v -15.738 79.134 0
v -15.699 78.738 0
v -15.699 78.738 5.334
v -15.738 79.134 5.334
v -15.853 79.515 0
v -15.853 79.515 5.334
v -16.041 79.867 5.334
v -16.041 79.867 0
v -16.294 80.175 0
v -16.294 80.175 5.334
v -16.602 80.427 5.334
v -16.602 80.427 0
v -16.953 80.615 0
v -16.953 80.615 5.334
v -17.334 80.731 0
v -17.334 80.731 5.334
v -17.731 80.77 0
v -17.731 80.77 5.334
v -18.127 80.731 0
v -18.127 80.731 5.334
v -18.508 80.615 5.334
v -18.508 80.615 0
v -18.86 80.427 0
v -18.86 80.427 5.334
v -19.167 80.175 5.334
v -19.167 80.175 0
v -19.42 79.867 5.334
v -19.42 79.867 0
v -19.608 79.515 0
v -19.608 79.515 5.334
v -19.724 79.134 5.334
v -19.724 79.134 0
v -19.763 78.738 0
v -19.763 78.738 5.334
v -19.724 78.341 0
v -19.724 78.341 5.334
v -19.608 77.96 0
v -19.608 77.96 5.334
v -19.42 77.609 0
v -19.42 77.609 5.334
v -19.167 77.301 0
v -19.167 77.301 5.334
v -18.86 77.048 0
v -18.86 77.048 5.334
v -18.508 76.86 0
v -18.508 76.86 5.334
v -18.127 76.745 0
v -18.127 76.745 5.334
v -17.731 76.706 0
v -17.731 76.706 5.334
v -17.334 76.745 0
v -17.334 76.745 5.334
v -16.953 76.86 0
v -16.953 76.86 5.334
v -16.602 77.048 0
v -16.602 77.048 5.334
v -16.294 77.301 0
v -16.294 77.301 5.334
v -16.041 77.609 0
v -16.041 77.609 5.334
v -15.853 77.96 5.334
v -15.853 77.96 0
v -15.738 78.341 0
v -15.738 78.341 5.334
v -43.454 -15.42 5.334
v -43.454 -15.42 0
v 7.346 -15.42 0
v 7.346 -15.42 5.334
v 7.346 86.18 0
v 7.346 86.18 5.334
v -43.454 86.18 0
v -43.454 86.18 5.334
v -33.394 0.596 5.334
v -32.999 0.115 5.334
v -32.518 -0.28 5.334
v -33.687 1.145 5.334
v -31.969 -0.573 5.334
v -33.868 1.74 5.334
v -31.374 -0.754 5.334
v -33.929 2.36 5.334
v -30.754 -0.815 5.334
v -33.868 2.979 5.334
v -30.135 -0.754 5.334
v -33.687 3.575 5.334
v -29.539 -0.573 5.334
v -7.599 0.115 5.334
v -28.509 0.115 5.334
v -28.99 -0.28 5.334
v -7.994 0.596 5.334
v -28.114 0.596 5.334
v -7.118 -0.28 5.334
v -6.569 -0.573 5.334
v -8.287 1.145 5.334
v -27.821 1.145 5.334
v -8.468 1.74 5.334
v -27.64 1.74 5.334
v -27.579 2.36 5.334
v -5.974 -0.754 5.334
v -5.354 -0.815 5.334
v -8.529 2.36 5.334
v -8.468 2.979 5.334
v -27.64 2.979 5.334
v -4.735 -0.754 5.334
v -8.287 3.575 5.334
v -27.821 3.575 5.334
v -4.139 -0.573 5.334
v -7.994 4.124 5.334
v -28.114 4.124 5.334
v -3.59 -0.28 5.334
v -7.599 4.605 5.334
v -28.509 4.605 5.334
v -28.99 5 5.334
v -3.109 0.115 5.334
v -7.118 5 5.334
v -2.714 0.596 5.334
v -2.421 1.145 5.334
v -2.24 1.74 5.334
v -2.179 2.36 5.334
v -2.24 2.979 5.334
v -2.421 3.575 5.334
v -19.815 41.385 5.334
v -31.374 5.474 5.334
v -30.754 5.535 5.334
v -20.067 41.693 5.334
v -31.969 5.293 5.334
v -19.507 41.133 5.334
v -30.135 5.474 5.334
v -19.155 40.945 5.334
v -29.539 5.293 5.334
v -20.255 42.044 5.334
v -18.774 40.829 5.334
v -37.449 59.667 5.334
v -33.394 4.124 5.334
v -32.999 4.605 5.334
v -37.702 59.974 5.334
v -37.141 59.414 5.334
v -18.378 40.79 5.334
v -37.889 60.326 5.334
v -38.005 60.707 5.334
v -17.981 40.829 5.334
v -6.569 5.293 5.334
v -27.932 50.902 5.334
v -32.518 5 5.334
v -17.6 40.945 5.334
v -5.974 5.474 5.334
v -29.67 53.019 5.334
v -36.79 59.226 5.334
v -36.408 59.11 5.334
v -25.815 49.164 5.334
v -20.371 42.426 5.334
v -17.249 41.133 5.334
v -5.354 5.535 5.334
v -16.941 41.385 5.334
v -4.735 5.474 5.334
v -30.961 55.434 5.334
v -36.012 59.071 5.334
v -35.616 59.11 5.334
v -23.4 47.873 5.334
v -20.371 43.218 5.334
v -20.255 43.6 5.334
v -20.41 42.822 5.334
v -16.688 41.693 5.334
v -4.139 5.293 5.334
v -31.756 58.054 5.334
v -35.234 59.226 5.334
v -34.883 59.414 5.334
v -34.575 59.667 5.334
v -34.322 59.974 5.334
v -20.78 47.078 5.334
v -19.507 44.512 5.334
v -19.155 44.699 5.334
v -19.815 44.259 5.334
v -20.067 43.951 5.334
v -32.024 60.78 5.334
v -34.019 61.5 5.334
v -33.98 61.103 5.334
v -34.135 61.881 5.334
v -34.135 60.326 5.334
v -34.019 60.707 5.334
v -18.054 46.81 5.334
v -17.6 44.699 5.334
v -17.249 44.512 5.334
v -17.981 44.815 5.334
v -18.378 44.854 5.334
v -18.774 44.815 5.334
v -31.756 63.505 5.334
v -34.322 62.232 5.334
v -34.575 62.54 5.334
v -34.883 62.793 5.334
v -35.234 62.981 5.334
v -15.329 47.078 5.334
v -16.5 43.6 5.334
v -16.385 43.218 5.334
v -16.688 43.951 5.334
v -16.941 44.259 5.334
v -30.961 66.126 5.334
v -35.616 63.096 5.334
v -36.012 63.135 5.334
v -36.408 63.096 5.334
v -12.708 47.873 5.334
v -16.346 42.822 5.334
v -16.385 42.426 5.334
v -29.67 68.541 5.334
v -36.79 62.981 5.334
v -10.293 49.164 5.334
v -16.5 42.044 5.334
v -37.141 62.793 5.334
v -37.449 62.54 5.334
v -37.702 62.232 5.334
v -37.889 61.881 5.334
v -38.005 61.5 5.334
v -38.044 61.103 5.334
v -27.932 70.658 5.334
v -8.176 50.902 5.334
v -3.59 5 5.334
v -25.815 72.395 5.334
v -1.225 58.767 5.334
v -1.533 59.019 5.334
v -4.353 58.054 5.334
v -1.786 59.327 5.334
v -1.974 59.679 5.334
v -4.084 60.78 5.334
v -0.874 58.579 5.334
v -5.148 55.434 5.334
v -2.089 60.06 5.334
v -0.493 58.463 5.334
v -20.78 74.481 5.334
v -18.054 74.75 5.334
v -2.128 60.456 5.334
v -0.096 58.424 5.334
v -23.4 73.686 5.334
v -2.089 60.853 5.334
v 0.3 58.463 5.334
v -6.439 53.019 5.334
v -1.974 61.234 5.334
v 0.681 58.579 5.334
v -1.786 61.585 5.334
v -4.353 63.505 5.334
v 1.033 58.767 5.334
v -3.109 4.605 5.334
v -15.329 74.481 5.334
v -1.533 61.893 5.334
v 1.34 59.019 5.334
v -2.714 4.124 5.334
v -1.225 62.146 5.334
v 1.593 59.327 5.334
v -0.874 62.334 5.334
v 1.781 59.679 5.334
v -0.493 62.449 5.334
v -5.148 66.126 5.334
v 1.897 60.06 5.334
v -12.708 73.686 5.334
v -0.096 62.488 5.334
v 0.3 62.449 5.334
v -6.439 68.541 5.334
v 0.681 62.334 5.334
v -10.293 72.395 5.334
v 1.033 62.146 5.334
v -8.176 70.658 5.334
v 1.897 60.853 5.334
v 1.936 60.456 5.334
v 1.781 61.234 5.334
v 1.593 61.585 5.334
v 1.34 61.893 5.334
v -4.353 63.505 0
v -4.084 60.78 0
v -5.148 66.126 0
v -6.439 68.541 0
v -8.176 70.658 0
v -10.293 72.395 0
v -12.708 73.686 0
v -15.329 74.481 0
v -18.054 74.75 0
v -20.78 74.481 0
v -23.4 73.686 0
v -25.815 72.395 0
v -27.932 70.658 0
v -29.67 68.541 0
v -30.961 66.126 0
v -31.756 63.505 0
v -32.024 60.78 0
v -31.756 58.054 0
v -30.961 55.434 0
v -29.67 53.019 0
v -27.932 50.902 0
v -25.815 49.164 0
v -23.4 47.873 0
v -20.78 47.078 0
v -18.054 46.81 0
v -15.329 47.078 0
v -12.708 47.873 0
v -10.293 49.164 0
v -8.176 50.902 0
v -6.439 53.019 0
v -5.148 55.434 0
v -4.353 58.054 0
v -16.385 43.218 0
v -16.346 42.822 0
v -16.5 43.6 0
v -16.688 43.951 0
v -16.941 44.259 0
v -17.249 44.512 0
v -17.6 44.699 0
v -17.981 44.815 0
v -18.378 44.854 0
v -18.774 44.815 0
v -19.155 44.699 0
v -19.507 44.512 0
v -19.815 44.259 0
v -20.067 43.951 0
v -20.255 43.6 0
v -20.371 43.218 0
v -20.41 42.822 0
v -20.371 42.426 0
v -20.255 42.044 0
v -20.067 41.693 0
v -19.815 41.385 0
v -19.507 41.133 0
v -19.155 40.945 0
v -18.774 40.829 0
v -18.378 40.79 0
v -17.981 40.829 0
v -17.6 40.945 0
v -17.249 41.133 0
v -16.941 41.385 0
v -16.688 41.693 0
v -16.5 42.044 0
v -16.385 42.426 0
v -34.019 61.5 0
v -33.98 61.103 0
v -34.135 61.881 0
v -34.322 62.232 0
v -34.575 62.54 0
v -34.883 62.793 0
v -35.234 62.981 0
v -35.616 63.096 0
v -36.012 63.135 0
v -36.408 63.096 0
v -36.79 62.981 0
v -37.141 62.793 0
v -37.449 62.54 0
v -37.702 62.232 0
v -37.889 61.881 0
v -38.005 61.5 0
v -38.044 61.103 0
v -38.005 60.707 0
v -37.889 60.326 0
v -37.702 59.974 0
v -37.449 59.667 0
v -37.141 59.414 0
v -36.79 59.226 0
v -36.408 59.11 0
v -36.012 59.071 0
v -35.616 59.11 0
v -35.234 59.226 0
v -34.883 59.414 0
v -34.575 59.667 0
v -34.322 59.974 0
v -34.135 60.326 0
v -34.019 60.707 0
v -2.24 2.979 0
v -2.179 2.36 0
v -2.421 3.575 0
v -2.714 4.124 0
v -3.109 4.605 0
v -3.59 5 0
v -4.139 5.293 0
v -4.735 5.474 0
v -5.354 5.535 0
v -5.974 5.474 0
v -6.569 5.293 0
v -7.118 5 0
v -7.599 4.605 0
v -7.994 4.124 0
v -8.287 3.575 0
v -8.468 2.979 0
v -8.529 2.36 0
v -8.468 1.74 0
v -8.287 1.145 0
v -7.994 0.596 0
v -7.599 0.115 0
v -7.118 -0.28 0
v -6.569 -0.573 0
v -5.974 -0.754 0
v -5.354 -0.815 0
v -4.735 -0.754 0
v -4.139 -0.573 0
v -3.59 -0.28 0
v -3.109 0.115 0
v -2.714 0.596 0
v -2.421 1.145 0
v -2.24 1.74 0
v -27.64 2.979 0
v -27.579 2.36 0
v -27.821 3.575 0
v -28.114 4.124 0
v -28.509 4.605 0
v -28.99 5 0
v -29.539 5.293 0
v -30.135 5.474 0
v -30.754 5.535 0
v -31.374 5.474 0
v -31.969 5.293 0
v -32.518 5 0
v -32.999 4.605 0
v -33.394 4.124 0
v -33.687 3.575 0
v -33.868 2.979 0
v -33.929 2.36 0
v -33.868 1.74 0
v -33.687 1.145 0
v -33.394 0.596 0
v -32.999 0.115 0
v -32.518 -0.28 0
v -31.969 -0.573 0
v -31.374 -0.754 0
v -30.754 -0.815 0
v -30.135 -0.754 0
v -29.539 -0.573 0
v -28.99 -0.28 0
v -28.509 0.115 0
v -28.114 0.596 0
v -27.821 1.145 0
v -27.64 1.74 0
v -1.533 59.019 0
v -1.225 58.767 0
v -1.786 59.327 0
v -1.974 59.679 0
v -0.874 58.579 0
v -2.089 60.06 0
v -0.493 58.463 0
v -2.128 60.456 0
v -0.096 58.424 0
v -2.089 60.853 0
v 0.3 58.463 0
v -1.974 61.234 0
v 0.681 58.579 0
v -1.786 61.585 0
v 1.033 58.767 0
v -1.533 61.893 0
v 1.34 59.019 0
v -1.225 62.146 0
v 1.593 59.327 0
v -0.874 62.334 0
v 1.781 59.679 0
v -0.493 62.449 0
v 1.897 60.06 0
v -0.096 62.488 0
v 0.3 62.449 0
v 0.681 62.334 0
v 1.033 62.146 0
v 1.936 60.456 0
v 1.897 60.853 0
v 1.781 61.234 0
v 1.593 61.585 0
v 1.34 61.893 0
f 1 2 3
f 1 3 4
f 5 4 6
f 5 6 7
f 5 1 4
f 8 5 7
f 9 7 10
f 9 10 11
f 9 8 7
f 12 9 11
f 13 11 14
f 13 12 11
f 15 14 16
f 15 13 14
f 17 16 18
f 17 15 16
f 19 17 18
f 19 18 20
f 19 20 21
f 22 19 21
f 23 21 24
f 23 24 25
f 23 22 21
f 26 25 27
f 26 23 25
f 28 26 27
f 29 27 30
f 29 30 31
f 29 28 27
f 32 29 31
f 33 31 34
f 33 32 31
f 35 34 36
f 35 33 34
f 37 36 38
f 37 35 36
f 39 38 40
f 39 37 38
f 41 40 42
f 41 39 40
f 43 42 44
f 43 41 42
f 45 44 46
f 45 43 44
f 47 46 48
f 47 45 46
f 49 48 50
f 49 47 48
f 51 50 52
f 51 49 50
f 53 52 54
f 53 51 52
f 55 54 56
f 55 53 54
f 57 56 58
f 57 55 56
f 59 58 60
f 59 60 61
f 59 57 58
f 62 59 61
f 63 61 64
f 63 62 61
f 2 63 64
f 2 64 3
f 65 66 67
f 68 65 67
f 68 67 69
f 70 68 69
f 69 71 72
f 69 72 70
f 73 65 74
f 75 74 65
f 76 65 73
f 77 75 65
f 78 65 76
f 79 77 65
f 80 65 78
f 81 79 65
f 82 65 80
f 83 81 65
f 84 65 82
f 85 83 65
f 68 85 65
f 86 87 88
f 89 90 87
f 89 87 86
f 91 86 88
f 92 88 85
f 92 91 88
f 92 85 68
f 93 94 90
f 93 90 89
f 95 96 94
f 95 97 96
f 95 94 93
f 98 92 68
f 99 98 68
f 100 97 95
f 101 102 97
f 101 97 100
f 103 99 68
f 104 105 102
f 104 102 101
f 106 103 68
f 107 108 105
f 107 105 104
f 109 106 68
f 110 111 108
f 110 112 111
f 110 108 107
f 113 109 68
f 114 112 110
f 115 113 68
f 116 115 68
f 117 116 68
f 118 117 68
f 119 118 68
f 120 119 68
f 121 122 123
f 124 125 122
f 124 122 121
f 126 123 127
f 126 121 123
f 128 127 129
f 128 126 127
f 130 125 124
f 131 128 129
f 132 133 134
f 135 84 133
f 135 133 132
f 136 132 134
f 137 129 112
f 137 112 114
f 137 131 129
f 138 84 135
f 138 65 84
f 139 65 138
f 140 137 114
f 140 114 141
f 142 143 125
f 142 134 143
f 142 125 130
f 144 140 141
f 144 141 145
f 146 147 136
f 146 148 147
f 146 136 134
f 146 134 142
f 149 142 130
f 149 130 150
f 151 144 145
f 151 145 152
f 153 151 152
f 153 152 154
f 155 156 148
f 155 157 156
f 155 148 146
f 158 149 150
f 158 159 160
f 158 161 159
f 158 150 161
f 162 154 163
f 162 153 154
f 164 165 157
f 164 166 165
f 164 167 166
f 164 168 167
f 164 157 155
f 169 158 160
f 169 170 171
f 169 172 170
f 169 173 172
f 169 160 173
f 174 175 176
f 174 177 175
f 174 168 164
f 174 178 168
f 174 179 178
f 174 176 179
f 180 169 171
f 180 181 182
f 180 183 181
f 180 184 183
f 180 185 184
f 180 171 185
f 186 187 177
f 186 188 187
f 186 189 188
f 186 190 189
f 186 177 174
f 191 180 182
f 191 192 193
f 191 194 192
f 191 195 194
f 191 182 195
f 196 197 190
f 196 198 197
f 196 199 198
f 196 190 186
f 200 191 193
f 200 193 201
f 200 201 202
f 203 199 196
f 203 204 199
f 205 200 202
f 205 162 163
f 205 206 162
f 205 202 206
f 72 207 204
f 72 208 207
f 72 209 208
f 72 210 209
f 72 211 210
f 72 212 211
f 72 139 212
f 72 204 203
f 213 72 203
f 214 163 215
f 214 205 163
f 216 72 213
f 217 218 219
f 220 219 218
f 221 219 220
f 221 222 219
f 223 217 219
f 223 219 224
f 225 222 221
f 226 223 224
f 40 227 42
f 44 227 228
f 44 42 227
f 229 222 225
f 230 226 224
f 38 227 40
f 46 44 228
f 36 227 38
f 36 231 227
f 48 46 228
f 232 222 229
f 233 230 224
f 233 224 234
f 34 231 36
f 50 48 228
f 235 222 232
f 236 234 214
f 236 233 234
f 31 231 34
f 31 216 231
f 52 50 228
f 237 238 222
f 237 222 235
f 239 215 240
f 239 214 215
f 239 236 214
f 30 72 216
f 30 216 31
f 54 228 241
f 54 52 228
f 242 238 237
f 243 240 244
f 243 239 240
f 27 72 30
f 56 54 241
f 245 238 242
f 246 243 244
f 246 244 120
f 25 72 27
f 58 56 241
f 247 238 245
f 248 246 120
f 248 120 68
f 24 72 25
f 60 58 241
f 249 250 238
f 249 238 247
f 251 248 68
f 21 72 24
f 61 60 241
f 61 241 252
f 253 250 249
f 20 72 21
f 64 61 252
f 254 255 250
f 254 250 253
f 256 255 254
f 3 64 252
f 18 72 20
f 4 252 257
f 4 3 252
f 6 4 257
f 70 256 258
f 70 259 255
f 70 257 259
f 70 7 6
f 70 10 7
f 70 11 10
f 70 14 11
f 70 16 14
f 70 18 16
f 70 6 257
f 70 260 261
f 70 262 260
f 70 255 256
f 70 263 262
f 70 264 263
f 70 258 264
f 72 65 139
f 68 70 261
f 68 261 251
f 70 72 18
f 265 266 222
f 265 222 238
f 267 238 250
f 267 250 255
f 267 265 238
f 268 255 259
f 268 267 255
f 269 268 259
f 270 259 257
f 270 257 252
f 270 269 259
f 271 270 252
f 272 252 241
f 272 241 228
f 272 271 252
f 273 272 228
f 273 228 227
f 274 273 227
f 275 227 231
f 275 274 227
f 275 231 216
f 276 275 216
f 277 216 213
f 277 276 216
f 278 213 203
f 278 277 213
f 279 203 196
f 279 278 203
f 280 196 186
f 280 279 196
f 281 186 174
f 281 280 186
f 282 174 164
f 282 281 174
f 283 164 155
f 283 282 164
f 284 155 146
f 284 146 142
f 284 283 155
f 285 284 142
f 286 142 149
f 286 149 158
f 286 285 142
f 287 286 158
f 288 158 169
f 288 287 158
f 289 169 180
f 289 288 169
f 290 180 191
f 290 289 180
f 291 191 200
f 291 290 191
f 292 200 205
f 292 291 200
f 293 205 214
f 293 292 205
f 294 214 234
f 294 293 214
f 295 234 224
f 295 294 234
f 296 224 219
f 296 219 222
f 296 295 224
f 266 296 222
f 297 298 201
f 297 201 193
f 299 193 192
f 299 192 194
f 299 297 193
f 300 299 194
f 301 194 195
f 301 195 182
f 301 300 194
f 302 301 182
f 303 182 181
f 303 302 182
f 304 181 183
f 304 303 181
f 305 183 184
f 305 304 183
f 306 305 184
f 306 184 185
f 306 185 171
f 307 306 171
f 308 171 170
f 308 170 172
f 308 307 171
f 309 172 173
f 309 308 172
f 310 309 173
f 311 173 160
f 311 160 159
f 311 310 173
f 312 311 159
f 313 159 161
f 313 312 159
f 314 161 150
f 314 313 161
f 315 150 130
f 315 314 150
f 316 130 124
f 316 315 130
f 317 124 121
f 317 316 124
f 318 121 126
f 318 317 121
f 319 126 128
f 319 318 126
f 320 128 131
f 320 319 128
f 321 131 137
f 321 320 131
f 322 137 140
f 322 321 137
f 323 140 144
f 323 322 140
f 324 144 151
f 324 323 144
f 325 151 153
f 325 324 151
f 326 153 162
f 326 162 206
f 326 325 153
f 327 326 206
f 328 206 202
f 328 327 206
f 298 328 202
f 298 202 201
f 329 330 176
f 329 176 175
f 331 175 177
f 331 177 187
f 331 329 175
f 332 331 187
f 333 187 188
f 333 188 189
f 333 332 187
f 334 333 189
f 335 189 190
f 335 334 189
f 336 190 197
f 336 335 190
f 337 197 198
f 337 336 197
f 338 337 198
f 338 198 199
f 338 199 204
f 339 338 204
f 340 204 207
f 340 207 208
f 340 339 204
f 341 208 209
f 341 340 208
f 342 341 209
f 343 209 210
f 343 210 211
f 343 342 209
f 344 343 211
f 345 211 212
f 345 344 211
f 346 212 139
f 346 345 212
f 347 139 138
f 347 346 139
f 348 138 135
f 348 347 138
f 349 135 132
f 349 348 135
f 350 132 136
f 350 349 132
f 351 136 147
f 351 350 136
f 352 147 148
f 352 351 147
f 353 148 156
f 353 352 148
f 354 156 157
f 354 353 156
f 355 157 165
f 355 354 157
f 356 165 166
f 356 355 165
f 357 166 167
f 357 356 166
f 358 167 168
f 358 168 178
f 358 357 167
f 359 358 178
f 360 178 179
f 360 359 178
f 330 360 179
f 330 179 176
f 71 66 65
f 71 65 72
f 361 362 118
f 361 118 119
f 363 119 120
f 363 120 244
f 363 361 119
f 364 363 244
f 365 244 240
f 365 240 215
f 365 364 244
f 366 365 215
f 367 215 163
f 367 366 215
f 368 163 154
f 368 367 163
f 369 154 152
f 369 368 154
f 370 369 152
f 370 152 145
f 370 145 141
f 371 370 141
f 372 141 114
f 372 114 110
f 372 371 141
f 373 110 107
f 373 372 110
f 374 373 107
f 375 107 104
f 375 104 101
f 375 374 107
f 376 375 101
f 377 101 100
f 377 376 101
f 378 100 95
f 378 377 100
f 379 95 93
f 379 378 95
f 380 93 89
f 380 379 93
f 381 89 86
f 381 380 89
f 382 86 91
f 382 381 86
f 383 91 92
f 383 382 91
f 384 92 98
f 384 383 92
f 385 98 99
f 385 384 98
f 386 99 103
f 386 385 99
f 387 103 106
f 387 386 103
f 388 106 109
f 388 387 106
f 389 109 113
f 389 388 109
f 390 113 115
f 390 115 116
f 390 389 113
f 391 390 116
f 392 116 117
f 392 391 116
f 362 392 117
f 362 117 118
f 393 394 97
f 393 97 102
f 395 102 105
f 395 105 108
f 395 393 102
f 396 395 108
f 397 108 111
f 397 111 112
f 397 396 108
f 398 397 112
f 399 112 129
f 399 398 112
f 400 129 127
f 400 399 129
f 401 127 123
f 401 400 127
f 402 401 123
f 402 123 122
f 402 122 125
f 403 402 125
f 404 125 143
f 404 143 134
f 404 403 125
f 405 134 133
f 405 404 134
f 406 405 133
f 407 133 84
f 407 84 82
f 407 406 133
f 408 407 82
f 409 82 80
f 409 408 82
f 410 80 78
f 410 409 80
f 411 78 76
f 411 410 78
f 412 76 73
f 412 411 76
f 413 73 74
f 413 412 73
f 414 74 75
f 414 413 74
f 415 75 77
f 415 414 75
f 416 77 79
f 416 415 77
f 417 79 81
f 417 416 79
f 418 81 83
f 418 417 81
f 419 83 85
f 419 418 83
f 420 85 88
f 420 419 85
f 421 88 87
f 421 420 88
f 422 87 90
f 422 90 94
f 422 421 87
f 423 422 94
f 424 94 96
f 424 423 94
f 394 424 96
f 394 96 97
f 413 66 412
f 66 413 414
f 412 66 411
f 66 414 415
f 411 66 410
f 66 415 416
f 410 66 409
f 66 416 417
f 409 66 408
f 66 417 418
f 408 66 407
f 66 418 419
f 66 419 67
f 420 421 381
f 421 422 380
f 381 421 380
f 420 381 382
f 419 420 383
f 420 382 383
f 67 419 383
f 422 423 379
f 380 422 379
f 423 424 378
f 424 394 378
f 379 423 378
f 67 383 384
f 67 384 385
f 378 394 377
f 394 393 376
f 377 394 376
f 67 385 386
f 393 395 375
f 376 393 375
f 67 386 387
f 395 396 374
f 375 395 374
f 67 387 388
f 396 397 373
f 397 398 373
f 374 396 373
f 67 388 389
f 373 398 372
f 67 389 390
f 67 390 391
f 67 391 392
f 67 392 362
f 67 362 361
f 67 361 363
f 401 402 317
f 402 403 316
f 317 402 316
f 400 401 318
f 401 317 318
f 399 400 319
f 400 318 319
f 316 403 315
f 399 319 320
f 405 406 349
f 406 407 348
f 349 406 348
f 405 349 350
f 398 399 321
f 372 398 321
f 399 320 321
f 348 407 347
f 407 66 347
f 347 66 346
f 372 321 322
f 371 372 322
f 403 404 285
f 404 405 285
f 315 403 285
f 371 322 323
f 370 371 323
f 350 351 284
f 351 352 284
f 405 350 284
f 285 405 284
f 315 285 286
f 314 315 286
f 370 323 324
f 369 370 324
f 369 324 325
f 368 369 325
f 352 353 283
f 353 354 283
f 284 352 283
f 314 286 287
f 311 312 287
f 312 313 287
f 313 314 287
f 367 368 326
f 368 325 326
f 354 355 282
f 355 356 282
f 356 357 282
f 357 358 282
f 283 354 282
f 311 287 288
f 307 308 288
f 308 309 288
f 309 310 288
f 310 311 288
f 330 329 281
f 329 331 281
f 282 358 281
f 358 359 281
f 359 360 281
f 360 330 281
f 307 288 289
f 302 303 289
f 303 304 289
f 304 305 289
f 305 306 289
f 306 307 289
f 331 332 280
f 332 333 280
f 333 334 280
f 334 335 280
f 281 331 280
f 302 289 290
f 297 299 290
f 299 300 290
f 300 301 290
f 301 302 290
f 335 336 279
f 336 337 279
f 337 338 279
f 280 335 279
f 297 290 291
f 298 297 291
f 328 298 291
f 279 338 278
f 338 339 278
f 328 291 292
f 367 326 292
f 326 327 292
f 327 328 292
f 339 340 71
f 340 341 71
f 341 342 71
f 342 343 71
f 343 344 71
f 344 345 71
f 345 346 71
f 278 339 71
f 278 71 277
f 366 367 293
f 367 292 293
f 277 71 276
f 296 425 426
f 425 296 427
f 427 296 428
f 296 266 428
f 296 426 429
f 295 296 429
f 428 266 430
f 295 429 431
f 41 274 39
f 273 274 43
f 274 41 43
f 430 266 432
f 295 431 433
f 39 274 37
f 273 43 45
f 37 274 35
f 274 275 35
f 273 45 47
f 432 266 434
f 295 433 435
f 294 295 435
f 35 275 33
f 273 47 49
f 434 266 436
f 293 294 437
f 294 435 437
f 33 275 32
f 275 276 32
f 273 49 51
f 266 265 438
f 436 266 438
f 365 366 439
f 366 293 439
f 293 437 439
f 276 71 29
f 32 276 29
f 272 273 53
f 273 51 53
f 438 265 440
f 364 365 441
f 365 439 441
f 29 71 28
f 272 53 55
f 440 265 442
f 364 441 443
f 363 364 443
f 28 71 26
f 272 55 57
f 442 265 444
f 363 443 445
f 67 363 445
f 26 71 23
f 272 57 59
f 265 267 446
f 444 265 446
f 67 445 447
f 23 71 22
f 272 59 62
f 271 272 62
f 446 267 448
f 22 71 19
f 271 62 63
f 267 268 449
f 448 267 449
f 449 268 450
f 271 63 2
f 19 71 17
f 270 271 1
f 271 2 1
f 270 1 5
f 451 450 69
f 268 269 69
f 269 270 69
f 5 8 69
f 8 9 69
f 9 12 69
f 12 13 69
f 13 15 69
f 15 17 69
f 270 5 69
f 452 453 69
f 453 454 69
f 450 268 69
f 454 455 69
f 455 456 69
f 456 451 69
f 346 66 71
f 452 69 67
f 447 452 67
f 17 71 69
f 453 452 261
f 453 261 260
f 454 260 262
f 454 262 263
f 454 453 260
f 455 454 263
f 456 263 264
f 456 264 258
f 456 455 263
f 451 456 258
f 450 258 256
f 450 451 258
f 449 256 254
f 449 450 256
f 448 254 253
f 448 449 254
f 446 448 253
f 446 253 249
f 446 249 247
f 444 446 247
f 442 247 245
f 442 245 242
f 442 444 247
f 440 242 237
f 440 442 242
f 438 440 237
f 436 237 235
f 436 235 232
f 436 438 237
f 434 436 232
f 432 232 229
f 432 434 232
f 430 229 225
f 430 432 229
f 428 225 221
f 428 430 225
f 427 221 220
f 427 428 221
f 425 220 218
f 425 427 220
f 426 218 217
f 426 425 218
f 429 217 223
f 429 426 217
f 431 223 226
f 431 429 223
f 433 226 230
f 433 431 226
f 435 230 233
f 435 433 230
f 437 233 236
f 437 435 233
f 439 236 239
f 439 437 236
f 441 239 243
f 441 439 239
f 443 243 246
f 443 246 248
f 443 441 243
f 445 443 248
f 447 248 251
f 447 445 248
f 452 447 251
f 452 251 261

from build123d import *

# Parameters (mm, degrees)
F0_W     = 50.8
F0_H     = 101.6
F0_R     = 3.175
F0_R_2   = 2.032
F0_R_3   = 13.97
F1_DEPTH = 5.334
F2_R     = 3.175
F3_DEPTH = 25.4


with BuildPart() as f1:
    # F0 (on Top) → F1 (new body)
    with BuildSketch(Plane.XY):
        with Locations((-18.054181, 35.379866)):
            Rectangle(F0_W, F0_H)
        with Locations((-30.754181, 2.359866)):
            Circle(F0_R, mode=Mode.SUBTRACT)
        with Locations((-5.354181, 2.359866)):
            Circle(F0_R, mode=Mode.SUBTRACT)
        with Locations((-18.377712, 42.822066)):
            Circle(F0_R_2, mode=Mode.SUBTRACT)
        with Locations((-36.011981, 61.103397)):
            Circle(F0_R_2, mode=Mode.SUBTRACT)
        with Locations((-18.054181, 60.779866)):
            Circle(F0_R_3, mode=Mode.SUBTRACT)
        with Locations((-0.096381, 60.456336)):
            Circle(F0_R_2, mode=Mode.SUBTRACT)
        with Locations((-17.730651, 78.737666)):
            Circle(F0_R_2, mode=Mode.SUBTRACT)
    extrude(amount=F1_DEPTH)

    # F2 (on face) → F3 (cut)
    with BuildSketch(Plane(origin=(0, 0, 0), x_dir=(1, 0, 0), z_dir=(0, 0, -1))):
        with Locations((-5.354181, -2.359866)):
            Circle(F2_R)
        with Locations((-30.754181, -2.359866)):
            Circle(F2_R)
    extrude(amount=-F3_DEPTH, mode=Mode.SUBTRACT)


solid = f1.part
